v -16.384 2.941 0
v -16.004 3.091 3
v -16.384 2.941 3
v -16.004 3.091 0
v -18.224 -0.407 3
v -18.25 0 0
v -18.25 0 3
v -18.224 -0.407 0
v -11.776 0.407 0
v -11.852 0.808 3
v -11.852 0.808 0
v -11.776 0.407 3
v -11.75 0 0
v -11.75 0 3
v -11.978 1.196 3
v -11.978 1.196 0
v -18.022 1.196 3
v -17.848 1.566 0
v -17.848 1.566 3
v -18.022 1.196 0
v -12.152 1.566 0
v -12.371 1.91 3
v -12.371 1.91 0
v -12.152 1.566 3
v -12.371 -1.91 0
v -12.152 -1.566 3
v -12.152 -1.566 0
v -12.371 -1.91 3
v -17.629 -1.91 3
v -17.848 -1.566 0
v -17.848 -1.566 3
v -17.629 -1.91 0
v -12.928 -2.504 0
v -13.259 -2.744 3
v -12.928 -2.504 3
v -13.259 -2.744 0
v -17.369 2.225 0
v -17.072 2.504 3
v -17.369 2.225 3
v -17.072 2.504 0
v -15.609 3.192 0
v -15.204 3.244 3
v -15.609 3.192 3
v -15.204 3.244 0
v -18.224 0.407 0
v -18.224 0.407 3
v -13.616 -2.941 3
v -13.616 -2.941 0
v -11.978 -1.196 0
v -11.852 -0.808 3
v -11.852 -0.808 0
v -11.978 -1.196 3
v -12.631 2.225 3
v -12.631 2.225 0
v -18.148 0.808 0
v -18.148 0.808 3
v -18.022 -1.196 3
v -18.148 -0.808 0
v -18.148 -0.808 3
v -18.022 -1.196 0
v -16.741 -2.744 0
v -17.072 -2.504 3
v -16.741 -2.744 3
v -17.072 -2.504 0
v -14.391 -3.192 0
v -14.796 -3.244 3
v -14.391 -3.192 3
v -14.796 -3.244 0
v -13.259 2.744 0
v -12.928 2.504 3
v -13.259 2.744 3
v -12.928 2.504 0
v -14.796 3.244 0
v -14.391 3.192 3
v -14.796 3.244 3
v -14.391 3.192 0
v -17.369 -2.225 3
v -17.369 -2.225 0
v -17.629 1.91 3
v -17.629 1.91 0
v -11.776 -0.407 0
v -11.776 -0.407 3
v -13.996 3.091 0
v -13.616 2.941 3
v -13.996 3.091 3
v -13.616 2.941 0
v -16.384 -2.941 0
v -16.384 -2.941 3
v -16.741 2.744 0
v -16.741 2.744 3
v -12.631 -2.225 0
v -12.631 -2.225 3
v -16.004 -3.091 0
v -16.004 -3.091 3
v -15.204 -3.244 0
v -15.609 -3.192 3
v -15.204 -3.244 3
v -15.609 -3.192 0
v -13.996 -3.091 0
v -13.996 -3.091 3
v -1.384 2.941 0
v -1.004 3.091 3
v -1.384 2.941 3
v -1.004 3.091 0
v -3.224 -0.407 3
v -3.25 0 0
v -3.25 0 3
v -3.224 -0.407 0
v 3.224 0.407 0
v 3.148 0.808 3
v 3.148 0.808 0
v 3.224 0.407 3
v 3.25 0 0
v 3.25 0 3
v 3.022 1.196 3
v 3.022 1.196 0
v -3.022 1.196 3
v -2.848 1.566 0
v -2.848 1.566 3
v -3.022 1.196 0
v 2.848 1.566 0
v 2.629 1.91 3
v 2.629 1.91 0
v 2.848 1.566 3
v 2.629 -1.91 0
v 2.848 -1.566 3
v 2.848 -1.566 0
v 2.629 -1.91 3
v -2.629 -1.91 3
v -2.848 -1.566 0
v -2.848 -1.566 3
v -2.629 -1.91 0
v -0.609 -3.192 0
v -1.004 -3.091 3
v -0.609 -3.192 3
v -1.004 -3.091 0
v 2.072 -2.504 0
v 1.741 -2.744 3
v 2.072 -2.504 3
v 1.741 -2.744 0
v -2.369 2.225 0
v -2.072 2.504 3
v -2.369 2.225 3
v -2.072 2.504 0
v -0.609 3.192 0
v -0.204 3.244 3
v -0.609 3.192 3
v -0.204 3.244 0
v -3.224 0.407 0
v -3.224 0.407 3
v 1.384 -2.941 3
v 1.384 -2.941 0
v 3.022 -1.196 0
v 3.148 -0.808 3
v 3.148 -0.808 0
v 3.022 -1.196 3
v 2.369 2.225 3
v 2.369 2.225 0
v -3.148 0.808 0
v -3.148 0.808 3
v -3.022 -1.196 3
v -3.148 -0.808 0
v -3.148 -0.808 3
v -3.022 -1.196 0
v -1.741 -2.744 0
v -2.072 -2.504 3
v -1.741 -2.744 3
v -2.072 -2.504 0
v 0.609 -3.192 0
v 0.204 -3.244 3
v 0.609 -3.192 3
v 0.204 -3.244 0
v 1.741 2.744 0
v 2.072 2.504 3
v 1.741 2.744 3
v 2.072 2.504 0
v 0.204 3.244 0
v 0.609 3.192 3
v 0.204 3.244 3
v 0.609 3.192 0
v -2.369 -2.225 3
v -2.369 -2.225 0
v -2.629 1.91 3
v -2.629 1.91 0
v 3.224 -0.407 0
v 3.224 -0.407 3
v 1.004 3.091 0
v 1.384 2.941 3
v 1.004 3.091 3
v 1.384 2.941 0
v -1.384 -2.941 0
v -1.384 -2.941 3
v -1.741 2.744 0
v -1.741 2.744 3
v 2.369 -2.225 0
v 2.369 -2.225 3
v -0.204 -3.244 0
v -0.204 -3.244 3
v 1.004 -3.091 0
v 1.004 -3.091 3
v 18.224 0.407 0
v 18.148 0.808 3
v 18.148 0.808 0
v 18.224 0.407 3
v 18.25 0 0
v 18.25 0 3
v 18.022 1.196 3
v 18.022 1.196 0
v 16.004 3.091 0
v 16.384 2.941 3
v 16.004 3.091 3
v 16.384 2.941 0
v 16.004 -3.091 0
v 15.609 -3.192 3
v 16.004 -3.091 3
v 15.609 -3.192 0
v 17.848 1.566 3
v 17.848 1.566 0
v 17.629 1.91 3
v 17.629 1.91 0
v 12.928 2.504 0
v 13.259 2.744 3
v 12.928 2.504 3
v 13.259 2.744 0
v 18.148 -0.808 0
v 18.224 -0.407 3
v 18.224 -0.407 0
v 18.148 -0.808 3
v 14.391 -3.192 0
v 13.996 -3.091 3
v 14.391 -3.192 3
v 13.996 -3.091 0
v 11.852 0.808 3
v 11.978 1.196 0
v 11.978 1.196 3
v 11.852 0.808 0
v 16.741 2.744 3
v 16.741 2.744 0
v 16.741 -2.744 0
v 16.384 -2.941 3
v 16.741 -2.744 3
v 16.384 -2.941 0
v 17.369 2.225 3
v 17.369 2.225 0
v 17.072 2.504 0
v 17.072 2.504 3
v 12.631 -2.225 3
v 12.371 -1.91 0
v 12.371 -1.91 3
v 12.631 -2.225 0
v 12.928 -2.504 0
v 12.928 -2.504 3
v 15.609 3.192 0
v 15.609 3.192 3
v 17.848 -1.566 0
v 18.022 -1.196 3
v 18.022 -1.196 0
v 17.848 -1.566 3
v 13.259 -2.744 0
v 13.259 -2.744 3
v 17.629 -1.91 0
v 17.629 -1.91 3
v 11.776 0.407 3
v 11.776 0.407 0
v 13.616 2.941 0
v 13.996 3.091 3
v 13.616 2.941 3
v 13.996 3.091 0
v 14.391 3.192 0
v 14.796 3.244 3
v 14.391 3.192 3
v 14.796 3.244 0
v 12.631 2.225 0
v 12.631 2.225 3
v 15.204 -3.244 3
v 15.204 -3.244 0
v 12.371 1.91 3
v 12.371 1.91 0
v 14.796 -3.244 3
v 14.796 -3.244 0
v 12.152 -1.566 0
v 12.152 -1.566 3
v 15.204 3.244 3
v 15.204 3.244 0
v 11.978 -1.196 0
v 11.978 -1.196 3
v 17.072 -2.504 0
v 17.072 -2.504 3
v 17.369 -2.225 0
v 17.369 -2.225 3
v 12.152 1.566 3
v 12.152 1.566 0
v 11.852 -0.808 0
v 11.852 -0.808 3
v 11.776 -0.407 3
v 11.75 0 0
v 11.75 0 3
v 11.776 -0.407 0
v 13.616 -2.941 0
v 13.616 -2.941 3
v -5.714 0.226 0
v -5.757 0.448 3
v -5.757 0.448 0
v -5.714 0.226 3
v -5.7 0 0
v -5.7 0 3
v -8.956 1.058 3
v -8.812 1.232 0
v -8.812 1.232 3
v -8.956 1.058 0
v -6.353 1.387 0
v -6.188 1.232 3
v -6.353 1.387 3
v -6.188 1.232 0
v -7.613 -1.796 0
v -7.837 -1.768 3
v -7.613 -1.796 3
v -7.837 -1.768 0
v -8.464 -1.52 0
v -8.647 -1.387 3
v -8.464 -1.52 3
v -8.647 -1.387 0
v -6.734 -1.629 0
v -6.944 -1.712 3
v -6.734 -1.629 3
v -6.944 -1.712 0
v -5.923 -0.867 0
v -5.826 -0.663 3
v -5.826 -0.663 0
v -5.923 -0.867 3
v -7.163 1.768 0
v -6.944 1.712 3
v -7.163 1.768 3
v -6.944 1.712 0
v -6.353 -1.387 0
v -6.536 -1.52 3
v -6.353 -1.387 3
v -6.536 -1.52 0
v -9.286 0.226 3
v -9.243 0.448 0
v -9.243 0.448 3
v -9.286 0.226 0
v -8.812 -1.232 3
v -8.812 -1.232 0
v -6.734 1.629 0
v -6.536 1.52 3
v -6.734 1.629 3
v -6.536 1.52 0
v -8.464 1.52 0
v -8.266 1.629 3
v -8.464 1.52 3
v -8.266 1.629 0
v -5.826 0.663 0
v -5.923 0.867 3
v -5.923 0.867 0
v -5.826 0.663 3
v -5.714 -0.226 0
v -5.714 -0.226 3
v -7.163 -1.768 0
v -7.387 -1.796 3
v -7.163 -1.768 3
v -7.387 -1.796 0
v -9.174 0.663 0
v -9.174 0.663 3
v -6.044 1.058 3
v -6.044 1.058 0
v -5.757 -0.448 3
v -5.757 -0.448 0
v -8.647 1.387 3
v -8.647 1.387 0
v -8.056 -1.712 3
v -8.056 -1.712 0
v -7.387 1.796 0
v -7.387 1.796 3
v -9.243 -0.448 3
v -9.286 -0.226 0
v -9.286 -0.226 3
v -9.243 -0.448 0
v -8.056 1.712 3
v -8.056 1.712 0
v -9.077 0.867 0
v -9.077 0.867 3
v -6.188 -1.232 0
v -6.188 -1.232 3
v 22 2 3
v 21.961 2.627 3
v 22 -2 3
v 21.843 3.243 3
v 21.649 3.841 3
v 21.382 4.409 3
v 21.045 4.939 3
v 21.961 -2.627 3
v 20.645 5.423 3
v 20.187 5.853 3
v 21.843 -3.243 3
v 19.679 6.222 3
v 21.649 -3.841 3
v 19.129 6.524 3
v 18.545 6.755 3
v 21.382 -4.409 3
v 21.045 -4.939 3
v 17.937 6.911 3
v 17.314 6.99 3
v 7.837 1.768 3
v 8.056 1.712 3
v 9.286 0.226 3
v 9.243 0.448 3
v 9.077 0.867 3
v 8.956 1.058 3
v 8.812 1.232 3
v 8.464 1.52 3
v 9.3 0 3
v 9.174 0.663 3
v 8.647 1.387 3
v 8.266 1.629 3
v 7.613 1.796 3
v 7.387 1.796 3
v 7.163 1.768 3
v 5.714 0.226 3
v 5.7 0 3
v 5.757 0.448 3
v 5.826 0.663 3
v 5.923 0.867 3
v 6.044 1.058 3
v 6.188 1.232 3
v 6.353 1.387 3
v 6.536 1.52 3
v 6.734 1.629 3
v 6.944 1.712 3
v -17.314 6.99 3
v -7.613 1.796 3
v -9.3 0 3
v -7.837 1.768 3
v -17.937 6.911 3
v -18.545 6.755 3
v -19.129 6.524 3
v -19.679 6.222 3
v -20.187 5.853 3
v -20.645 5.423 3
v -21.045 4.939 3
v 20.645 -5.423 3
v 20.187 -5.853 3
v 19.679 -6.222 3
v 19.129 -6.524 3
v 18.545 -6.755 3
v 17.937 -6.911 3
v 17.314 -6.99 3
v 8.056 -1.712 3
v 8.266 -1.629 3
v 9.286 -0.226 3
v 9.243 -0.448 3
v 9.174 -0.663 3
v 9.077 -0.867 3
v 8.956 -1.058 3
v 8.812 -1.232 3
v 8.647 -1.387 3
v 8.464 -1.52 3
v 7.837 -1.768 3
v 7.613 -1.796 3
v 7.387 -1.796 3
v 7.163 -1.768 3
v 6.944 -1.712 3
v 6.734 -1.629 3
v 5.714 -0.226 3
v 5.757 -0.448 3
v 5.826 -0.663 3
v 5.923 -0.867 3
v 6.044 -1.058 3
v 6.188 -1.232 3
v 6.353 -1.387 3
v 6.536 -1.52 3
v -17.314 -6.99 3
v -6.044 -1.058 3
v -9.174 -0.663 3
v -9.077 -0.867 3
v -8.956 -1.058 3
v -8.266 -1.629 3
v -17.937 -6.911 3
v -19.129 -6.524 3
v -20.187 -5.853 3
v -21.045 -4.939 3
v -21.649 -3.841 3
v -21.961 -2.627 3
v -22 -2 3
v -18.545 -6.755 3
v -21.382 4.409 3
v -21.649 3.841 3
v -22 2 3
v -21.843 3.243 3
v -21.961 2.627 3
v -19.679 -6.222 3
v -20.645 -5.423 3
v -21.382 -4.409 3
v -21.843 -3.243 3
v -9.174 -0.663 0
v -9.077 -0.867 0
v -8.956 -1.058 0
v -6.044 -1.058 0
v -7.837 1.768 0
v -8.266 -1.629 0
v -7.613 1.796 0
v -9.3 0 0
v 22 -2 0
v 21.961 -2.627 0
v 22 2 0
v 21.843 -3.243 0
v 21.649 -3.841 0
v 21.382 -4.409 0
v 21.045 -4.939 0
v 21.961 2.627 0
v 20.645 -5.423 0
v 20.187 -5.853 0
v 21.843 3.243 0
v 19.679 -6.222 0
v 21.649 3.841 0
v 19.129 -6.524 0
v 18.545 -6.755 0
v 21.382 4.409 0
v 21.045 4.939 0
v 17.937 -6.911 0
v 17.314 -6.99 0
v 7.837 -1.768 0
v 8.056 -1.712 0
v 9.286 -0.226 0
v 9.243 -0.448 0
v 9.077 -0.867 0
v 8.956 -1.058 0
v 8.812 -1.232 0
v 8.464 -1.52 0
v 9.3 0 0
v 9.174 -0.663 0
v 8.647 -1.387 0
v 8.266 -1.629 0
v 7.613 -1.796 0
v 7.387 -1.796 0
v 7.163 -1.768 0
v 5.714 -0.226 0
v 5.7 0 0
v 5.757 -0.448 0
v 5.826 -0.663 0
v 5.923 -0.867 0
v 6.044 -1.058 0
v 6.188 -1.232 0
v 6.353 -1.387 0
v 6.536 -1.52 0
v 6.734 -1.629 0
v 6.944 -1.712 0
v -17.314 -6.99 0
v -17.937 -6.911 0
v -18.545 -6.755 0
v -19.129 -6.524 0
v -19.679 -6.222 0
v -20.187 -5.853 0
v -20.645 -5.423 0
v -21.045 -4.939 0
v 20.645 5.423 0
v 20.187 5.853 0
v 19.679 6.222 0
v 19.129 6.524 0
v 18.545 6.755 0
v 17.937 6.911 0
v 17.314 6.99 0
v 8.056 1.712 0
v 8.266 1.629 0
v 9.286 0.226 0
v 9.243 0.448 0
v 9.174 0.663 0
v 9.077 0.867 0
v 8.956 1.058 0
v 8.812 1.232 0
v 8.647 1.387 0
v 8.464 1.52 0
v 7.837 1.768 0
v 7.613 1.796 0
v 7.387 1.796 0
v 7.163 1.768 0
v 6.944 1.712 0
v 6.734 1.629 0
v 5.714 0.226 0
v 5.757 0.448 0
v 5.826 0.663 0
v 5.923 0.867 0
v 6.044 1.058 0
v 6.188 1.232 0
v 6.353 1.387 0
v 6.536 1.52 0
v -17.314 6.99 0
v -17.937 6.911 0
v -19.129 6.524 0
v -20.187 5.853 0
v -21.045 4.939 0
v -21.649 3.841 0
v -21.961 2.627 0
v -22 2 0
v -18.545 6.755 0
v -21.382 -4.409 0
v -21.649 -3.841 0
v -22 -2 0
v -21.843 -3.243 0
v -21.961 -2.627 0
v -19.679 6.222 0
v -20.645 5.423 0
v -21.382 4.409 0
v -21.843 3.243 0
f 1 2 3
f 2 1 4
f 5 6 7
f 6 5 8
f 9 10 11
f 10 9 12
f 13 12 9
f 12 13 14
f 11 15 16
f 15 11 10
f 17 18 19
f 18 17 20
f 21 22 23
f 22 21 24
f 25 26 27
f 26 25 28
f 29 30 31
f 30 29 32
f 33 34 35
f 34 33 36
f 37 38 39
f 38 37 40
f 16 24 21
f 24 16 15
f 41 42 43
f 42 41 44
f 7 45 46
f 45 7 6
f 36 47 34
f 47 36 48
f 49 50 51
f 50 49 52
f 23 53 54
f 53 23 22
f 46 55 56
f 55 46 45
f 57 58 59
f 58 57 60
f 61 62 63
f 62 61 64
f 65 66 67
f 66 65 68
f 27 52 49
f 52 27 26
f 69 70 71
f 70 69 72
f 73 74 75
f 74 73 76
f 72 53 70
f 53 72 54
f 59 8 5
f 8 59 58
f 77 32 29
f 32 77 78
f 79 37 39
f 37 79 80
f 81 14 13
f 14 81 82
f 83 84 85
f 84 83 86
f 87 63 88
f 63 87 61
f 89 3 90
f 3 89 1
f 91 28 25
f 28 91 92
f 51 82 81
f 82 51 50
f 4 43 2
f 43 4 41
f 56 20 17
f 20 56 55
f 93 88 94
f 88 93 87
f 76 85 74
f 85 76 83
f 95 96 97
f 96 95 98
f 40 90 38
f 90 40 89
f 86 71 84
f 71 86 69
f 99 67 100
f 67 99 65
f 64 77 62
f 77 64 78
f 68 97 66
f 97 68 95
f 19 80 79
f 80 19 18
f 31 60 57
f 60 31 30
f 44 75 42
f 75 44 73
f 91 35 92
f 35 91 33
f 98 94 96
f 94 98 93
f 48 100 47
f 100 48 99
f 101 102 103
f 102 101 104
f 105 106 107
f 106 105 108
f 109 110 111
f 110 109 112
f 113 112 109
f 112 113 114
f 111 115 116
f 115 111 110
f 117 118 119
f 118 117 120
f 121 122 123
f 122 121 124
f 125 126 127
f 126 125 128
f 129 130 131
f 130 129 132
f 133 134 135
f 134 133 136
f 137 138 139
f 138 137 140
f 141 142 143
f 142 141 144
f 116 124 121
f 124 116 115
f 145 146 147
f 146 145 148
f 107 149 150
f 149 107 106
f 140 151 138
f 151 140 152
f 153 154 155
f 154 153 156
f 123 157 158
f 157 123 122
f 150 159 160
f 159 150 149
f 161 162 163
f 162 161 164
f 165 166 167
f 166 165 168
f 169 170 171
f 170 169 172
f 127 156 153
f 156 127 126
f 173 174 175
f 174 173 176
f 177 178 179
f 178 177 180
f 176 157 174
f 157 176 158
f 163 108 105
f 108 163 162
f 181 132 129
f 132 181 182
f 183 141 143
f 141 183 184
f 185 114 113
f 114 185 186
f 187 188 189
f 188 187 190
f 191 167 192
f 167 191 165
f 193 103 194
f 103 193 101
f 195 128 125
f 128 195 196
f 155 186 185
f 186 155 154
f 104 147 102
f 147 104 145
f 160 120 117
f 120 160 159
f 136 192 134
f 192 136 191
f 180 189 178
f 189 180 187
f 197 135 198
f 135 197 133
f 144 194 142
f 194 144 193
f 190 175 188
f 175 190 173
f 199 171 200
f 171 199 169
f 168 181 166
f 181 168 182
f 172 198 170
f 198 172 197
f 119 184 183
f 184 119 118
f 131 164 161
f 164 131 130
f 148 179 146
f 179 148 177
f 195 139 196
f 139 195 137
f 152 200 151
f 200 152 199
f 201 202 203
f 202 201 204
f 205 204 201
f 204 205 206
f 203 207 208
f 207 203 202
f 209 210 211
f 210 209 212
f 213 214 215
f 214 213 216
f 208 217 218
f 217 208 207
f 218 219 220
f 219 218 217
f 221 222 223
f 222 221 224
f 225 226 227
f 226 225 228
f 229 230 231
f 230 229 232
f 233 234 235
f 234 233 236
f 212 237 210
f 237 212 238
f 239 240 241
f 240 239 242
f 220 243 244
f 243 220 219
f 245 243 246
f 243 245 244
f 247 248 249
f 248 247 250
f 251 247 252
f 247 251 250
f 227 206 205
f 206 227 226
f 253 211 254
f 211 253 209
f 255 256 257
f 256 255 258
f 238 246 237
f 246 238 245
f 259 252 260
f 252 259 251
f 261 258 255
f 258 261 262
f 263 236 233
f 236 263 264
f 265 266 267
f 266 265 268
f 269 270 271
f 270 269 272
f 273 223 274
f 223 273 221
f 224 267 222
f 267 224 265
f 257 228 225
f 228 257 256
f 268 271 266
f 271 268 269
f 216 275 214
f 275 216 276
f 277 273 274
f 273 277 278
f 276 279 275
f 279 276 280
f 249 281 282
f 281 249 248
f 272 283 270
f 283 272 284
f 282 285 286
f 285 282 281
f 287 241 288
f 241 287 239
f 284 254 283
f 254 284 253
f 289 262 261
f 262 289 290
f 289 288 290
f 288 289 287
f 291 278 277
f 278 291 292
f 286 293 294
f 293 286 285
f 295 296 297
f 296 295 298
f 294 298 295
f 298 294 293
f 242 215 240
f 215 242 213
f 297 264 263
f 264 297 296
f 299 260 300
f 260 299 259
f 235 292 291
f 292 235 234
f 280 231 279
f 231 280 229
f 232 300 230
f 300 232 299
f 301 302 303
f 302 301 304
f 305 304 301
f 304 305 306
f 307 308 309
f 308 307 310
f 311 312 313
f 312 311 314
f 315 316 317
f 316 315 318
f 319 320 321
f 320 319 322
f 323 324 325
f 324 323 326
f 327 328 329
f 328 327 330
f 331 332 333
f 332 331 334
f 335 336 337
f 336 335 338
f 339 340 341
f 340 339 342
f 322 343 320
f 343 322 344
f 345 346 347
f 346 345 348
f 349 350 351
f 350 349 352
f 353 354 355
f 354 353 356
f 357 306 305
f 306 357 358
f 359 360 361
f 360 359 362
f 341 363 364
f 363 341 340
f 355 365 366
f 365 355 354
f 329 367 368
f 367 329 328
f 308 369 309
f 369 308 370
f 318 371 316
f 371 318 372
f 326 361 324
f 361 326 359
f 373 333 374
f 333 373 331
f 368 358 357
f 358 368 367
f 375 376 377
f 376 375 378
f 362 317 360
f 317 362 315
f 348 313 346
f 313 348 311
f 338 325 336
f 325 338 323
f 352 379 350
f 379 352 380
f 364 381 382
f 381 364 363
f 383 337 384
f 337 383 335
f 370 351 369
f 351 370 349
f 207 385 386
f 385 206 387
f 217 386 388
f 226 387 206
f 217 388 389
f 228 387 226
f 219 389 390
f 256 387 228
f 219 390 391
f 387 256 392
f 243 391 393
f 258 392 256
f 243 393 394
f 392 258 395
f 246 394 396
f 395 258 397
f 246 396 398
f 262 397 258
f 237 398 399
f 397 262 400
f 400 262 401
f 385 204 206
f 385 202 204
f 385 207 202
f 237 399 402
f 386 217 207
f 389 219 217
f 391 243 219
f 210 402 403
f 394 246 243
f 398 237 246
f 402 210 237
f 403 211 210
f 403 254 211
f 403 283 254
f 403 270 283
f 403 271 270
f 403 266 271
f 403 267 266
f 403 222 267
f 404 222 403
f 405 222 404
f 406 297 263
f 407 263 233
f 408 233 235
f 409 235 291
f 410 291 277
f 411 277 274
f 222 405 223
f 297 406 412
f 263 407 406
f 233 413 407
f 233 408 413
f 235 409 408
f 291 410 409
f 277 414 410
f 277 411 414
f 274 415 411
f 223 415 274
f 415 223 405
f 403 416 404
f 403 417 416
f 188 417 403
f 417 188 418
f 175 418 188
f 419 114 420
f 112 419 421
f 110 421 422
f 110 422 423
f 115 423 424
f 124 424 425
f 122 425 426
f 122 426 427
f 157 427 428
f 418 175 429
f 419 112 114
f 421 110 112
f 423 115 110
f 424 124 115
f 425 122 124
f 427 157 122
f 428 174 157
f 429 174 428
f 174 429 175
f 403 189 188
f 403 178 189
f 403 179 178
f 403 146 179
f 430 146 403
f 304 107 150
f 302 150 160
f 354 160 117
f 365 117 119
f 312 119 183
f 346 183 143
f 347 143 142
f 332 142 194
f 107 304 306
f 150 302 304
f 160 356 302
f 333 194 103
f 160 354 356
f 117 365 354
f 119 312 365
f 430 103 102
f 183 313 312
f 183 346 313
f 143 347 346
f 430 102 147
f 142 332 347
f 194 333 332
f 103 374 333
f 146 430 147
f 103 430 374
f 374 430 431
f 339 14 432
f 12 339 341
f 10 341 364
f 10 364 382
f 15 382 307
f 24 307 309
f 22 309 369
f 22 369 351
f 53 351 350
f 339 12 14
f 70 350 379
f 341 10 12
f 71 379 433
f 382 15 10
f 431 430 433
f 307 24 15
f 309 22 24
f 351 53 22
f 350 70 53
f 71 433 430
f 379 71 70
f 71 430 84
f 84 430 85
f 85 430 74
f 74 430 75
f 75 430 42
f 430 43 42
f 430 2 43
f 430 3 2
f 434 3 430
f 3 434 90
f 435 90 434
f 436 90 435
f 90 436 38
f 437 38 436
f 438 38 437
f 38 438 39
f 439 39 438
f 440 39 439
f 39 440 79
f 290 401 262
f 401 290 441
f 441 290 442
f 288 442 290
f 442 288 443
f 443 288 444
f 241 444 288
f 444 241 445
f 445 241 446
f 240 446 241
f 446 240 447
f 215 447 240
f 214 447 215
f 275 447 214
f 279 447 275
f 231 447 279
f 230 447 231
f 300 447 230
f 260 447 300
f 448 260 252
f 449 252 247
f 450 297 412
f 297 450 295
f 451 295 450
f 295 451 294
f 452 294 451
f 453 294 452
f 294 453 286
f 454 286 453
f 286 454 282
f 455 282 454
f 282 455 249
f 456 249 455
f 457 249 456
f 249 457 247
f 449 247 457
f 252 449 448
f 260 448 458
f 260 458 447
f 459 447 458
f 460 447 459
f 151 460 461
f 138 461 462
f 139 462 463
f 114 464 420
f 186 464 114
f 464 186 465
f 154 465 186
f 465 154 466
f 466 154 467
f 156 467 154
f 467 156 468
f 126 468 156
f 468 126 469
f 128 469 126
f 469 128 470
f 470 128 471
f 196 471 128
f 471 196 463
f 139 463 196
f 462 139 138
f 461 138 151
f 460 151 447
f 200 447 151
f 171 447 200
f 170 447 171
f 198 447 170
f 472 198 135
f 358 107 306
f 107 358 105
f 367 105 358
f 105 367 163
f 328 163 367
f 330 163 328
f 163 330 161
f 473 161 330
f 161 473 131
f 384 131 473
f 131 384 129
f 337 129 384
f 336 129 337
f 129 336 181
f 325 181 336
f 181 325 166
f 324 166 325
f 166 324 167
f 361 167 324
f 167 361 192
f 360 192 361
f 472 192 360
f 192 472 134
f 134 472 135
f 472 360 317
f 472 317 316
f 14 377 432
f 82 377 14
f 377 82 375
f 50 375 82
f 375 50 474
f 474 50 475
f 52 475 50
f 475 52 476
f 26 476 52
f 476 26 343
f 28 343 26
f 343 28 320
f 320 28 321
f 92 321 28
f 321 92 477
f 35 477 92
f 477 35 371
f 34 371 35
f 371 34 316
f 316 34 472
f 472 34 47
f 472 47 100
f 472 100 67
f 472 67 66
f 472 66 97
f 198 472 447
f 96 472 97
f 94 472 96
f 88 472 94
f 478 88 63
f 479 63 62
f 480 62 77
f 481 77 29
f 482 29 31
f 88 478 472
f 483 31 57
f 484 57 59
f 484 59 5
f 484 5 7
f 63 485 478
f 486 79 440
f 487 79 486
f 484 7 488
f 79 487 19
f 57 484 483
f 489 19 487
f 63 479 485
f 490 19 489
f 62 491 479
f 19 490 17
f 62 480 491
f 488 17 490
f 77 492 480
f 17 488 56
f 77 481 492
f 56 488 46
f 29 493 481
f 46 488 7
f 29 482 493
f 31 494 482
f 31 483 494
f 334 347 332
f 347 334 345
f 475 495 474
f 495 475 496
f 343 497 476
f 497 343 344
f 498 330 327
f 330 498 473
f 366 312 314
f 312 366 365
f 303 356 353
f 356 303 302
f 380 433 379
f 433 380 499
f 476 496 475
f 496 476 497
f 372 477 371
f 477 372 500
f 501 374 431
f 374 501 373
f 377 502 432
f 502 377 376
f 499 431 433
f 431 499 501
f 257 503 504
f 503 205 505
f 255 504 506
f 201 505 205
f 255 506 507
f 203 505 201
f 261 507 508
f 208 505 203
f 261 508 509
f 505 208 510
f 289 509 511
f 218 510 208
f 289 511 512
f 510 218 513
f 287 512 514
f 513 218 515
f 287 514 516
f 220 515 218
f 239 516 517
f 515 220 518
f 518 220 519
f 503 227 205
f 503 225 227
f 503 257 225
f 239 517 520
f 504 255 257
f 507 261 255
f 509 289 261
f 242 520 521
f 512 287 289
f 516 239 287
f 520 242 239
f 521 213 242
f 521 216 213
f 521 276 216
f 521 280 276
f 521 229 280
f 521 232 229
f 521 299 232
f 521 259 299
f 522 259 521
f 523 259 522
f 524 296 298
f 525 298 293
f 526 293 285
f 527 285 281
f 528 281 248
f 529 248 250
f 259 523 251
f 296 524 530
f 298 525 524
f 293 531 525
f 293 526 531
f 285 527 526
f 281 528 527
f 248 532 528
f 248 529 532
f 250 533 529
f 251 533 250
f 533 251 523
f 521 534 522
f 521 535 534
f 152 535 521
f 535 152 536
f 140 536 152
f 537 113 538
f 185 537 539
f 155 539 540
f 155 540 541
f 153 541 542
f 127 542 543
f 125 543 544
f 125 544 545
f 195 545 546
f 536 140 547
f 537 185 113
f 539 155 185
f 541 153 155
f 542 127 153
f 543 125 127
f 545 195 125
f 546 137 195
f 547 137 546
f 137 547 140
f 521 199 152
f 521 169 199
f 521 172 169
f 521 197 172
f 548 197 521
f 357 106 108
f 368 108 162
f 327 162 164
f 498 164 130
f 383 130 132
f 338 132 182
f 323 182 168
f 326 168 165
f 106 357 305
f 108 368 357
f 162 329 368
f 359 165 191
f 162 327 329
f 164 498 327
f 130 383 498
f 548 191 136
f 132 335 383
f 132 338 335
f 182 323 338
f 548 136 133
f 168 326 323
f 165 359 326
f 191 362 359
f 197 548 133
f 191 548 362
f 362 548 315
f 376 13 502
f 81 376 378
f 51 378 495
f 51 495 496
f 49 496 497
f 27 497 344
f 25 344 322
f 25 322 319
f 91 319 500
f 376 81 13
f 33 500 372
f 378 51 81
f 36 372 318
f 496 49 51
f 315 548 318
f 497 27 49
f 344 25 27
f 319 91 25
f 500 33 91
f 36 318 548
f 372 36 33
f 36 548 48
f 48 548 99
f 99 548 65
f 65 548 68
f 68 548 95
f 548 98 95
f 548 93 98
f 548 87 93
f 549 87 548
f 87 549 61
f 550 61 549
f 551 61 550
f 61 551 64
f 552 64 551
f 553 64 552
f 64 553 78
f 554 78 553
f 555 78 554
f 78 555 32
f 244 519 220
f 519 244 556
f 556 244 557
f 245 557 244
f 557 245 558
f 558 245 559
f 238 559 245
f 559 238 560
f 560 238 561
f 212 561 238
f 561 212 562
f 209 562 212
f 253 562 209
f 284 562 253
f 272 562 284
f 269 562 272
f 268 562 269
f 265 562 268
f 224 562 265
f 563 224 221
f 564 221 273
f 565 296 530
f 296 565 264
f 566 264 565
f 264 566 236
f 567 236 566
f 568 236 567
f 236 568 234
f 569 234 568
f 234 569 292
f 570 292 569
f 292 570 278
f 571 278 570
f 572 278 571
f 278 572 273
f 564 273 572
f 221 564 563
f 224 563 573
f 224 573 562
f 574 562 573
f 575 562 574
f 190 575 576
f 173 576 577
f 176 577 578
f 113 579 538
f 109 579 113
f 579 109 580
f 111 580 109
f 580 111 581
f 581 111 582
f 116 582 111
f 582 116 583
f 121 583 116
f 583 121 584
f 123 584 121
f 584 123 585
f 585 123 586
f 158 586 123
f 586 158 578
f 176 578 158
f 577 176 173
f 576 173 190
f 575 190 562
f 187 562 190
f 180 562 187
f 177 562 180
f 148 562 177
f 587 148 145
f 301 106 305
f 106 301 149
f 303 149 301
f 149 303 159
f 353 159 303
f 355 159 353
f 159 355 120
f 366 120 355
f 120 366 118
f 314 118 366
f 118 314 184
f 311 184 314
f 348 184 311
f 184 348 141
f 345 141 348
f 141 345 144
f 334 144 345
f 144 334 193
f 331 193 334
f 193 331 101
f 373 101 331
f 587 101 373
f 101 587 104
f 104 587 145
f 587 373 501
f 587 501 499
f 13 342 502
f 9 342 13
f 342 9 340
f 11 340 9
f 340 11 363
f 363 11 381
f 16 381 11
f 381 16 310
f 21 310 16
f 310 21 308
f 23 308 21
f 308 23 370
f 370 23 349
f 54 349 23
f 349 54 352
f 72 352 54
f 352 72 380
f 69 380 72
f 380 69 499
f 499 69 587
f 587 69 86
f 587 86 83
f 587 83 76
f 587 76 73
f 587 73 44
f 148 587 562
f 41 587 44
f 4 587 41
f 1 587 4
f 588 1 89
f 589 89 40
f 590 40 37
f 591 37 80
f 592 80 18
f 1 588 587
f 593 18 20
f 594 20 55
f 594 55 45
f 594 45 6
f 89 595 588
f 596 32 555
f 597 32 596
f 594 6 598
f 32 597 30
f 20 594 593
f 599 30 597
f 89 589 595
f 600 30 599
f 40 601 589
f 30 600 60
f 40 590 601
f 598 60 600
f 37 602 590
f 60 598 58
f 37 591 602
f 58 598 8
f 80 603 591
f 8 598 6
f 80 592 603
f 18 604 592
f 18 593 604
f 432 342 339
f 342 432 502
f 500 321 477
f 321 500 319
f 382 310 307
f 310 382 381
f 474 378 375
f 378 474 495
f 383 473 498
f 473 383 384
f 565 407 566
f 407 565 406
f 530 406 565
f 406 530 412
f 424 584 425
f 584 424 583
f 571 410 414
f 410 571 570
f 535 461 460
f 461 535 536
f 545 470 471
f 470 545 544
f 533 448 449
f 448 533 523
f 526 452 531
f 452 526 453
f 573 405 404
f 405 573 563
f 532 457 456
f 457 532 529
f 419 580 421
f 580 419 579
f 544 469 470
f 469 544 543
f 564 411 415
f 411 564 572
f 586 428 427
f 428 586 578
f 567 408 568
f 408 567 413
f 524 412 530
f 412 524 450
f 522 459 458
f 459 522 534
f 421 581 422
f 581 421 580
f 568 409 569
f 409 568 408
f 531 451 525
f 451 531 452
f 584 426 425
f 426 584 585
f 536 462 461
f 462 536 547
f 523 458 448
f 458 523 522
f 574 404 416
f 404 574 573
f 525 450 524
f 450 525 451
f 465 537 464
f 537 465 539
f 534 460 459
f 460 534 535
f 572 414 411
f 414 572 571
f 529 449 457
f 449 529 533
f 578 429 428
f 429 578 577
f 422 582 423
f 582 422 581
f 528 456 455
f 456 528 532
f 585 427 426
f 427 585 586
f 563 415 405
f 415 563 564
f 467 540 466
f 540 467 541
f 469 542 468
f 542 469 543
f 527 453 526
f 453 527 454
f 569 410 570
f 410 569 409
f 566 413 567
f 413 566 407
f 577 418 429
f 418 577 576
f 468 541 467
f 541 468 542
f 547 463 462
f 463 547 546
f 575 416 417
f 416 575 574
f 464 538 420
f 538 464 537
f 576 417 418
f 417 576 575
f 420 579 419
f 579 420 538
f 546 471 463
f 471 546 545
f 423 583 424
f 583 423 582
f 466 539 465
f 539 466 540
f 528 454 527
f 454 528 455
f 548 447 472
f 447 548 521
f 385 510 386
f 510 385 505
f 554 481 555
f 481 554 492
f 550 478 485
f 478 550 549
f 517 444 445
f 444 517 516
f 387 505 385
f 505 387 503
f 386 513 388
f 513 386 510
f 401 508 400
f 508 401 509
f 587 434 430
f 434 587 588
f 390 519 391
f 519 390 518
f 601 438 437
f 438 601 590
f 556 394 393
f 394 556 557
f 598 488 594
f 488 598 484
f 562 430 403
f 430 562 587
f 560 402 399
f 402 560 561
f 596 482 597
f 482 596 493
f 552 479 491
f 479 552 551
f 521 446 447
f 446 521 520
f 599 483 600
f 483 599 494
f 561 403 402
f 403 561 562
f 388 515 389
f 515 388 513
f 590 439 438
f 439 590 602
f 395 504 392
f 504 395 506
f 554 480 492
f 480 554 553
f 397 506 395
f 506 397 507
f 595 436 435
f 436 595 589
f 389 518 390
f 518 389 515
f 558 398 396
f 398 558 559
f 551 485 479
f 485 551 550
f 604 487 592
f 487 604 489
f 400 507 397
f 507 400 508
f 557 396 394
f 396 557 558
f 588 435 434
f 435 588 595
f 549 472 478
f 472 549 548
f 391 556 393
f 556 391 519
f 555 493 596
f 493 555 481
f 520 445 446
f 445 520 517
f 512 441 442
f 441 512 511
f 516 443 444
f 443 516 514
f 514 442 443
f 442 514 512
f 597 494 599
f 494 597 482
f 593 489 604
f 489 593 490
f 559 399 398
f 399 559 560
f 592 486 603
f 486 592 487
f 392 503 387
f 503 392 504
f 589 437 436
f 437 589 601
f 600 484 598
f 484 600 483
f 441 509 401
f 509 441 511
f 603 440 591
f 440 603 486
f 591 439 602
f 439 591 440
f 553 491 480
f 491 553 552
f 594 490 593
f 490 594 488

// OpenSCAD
$fn = 50;


difference() {
	union() {
		hull() {
			translate(v = [-17.0000000000, 2.0000000000, 0]) {
				cylinder(h = 3, r = 5);
			}
			translate(v = [17.0000000000, 2.0000000000, 0]) {
				cylinder(h = 3, r = 5);
			}
			translate(v = [-17.0000000000, -2.0000000000, 0]) {
				cylinder(h = 3, r = 5);
			}
			translate(v = [17.0000000000, -2.0000000000, 0]) {
				cylinder(h = 3, r = 5);
			}
		}
	}
	union() {
		translate(v = [-15.0000000000, 0.0000000000, -100.0000000000]) {
			cylinder(h = 200, r = 3.2500000000);
		}
		translate(v = [0.0000000000, 0.0000000000, -100.0000000000]) {
			cylinder(h = 200, r = 3.2500000000);
		}
		translate(v = [15.0000000000, 0.0000000000, -100.0000000000]) {
			cylinder(h = 200, r = 3.2500000000);
		}
		translate(v = [-15.0000000000, 0.0000000000, 0]) {
			cylinder(h = 3, r = 1.8000000000);
		}
		translate(v = [-7.5000000000, 0.0000000000, 0]) {
			cylinder(h = 3, r = 1.8000000000);
		}
		cylinder(h = 3, r = 1.8000000000);
		translate(v = [7.5000000000, 0.0000000000, 0]) {
			cylinder(h = 3, r = 1.8000000000);
		}
		translate(v = [15.0000000000, 0.0000000000, 0]) {
			cylinder(h = 3, r = 1.8000000000);
		}
		translate(v = [-15.0000000000, 0.0000000000, 0]) {
			cylinder(h = 3, r = 1.8000000000);
		}
		translate(v = [-7.5000000000, 0.0000000000, 0]) {
			cylinder(h = 3, r = 1.8000000000);
		}
		cylinder(h = 3, r = 1.8000000000);
		translate(v = [7.5000000000, 0.0000000000, 0]) {
			cylinder(h = 3, r = 1.8000000000);
		}
		translate(v = [15.0000000000, 0.0000000000, 0]) {
			cylinder(h = 3, r = 1.8000000000);
		}
		translate(v = [-15.0000000000, 0.0000000000, 0]) {
			cylinder(h = 3, r = 1.8000000000);
		}
		translate(v = [-7.5000000000, 0.0000000000, 0]) {
			cylinder(h = 3, r = 1.8000000000);
		}
		cylinder(h = 3, r = 1.8000000000);
		translate(v = [7.5000000000, 0.0000000000, 0]) {
			cylinder(h = 3, r = 1.8000000000);
		}
		translate(v = [15.0000000000, 0.0000000000, 0]) {
			cylinder(h = 3, r = 1.8000000000);
		}
	}
}
